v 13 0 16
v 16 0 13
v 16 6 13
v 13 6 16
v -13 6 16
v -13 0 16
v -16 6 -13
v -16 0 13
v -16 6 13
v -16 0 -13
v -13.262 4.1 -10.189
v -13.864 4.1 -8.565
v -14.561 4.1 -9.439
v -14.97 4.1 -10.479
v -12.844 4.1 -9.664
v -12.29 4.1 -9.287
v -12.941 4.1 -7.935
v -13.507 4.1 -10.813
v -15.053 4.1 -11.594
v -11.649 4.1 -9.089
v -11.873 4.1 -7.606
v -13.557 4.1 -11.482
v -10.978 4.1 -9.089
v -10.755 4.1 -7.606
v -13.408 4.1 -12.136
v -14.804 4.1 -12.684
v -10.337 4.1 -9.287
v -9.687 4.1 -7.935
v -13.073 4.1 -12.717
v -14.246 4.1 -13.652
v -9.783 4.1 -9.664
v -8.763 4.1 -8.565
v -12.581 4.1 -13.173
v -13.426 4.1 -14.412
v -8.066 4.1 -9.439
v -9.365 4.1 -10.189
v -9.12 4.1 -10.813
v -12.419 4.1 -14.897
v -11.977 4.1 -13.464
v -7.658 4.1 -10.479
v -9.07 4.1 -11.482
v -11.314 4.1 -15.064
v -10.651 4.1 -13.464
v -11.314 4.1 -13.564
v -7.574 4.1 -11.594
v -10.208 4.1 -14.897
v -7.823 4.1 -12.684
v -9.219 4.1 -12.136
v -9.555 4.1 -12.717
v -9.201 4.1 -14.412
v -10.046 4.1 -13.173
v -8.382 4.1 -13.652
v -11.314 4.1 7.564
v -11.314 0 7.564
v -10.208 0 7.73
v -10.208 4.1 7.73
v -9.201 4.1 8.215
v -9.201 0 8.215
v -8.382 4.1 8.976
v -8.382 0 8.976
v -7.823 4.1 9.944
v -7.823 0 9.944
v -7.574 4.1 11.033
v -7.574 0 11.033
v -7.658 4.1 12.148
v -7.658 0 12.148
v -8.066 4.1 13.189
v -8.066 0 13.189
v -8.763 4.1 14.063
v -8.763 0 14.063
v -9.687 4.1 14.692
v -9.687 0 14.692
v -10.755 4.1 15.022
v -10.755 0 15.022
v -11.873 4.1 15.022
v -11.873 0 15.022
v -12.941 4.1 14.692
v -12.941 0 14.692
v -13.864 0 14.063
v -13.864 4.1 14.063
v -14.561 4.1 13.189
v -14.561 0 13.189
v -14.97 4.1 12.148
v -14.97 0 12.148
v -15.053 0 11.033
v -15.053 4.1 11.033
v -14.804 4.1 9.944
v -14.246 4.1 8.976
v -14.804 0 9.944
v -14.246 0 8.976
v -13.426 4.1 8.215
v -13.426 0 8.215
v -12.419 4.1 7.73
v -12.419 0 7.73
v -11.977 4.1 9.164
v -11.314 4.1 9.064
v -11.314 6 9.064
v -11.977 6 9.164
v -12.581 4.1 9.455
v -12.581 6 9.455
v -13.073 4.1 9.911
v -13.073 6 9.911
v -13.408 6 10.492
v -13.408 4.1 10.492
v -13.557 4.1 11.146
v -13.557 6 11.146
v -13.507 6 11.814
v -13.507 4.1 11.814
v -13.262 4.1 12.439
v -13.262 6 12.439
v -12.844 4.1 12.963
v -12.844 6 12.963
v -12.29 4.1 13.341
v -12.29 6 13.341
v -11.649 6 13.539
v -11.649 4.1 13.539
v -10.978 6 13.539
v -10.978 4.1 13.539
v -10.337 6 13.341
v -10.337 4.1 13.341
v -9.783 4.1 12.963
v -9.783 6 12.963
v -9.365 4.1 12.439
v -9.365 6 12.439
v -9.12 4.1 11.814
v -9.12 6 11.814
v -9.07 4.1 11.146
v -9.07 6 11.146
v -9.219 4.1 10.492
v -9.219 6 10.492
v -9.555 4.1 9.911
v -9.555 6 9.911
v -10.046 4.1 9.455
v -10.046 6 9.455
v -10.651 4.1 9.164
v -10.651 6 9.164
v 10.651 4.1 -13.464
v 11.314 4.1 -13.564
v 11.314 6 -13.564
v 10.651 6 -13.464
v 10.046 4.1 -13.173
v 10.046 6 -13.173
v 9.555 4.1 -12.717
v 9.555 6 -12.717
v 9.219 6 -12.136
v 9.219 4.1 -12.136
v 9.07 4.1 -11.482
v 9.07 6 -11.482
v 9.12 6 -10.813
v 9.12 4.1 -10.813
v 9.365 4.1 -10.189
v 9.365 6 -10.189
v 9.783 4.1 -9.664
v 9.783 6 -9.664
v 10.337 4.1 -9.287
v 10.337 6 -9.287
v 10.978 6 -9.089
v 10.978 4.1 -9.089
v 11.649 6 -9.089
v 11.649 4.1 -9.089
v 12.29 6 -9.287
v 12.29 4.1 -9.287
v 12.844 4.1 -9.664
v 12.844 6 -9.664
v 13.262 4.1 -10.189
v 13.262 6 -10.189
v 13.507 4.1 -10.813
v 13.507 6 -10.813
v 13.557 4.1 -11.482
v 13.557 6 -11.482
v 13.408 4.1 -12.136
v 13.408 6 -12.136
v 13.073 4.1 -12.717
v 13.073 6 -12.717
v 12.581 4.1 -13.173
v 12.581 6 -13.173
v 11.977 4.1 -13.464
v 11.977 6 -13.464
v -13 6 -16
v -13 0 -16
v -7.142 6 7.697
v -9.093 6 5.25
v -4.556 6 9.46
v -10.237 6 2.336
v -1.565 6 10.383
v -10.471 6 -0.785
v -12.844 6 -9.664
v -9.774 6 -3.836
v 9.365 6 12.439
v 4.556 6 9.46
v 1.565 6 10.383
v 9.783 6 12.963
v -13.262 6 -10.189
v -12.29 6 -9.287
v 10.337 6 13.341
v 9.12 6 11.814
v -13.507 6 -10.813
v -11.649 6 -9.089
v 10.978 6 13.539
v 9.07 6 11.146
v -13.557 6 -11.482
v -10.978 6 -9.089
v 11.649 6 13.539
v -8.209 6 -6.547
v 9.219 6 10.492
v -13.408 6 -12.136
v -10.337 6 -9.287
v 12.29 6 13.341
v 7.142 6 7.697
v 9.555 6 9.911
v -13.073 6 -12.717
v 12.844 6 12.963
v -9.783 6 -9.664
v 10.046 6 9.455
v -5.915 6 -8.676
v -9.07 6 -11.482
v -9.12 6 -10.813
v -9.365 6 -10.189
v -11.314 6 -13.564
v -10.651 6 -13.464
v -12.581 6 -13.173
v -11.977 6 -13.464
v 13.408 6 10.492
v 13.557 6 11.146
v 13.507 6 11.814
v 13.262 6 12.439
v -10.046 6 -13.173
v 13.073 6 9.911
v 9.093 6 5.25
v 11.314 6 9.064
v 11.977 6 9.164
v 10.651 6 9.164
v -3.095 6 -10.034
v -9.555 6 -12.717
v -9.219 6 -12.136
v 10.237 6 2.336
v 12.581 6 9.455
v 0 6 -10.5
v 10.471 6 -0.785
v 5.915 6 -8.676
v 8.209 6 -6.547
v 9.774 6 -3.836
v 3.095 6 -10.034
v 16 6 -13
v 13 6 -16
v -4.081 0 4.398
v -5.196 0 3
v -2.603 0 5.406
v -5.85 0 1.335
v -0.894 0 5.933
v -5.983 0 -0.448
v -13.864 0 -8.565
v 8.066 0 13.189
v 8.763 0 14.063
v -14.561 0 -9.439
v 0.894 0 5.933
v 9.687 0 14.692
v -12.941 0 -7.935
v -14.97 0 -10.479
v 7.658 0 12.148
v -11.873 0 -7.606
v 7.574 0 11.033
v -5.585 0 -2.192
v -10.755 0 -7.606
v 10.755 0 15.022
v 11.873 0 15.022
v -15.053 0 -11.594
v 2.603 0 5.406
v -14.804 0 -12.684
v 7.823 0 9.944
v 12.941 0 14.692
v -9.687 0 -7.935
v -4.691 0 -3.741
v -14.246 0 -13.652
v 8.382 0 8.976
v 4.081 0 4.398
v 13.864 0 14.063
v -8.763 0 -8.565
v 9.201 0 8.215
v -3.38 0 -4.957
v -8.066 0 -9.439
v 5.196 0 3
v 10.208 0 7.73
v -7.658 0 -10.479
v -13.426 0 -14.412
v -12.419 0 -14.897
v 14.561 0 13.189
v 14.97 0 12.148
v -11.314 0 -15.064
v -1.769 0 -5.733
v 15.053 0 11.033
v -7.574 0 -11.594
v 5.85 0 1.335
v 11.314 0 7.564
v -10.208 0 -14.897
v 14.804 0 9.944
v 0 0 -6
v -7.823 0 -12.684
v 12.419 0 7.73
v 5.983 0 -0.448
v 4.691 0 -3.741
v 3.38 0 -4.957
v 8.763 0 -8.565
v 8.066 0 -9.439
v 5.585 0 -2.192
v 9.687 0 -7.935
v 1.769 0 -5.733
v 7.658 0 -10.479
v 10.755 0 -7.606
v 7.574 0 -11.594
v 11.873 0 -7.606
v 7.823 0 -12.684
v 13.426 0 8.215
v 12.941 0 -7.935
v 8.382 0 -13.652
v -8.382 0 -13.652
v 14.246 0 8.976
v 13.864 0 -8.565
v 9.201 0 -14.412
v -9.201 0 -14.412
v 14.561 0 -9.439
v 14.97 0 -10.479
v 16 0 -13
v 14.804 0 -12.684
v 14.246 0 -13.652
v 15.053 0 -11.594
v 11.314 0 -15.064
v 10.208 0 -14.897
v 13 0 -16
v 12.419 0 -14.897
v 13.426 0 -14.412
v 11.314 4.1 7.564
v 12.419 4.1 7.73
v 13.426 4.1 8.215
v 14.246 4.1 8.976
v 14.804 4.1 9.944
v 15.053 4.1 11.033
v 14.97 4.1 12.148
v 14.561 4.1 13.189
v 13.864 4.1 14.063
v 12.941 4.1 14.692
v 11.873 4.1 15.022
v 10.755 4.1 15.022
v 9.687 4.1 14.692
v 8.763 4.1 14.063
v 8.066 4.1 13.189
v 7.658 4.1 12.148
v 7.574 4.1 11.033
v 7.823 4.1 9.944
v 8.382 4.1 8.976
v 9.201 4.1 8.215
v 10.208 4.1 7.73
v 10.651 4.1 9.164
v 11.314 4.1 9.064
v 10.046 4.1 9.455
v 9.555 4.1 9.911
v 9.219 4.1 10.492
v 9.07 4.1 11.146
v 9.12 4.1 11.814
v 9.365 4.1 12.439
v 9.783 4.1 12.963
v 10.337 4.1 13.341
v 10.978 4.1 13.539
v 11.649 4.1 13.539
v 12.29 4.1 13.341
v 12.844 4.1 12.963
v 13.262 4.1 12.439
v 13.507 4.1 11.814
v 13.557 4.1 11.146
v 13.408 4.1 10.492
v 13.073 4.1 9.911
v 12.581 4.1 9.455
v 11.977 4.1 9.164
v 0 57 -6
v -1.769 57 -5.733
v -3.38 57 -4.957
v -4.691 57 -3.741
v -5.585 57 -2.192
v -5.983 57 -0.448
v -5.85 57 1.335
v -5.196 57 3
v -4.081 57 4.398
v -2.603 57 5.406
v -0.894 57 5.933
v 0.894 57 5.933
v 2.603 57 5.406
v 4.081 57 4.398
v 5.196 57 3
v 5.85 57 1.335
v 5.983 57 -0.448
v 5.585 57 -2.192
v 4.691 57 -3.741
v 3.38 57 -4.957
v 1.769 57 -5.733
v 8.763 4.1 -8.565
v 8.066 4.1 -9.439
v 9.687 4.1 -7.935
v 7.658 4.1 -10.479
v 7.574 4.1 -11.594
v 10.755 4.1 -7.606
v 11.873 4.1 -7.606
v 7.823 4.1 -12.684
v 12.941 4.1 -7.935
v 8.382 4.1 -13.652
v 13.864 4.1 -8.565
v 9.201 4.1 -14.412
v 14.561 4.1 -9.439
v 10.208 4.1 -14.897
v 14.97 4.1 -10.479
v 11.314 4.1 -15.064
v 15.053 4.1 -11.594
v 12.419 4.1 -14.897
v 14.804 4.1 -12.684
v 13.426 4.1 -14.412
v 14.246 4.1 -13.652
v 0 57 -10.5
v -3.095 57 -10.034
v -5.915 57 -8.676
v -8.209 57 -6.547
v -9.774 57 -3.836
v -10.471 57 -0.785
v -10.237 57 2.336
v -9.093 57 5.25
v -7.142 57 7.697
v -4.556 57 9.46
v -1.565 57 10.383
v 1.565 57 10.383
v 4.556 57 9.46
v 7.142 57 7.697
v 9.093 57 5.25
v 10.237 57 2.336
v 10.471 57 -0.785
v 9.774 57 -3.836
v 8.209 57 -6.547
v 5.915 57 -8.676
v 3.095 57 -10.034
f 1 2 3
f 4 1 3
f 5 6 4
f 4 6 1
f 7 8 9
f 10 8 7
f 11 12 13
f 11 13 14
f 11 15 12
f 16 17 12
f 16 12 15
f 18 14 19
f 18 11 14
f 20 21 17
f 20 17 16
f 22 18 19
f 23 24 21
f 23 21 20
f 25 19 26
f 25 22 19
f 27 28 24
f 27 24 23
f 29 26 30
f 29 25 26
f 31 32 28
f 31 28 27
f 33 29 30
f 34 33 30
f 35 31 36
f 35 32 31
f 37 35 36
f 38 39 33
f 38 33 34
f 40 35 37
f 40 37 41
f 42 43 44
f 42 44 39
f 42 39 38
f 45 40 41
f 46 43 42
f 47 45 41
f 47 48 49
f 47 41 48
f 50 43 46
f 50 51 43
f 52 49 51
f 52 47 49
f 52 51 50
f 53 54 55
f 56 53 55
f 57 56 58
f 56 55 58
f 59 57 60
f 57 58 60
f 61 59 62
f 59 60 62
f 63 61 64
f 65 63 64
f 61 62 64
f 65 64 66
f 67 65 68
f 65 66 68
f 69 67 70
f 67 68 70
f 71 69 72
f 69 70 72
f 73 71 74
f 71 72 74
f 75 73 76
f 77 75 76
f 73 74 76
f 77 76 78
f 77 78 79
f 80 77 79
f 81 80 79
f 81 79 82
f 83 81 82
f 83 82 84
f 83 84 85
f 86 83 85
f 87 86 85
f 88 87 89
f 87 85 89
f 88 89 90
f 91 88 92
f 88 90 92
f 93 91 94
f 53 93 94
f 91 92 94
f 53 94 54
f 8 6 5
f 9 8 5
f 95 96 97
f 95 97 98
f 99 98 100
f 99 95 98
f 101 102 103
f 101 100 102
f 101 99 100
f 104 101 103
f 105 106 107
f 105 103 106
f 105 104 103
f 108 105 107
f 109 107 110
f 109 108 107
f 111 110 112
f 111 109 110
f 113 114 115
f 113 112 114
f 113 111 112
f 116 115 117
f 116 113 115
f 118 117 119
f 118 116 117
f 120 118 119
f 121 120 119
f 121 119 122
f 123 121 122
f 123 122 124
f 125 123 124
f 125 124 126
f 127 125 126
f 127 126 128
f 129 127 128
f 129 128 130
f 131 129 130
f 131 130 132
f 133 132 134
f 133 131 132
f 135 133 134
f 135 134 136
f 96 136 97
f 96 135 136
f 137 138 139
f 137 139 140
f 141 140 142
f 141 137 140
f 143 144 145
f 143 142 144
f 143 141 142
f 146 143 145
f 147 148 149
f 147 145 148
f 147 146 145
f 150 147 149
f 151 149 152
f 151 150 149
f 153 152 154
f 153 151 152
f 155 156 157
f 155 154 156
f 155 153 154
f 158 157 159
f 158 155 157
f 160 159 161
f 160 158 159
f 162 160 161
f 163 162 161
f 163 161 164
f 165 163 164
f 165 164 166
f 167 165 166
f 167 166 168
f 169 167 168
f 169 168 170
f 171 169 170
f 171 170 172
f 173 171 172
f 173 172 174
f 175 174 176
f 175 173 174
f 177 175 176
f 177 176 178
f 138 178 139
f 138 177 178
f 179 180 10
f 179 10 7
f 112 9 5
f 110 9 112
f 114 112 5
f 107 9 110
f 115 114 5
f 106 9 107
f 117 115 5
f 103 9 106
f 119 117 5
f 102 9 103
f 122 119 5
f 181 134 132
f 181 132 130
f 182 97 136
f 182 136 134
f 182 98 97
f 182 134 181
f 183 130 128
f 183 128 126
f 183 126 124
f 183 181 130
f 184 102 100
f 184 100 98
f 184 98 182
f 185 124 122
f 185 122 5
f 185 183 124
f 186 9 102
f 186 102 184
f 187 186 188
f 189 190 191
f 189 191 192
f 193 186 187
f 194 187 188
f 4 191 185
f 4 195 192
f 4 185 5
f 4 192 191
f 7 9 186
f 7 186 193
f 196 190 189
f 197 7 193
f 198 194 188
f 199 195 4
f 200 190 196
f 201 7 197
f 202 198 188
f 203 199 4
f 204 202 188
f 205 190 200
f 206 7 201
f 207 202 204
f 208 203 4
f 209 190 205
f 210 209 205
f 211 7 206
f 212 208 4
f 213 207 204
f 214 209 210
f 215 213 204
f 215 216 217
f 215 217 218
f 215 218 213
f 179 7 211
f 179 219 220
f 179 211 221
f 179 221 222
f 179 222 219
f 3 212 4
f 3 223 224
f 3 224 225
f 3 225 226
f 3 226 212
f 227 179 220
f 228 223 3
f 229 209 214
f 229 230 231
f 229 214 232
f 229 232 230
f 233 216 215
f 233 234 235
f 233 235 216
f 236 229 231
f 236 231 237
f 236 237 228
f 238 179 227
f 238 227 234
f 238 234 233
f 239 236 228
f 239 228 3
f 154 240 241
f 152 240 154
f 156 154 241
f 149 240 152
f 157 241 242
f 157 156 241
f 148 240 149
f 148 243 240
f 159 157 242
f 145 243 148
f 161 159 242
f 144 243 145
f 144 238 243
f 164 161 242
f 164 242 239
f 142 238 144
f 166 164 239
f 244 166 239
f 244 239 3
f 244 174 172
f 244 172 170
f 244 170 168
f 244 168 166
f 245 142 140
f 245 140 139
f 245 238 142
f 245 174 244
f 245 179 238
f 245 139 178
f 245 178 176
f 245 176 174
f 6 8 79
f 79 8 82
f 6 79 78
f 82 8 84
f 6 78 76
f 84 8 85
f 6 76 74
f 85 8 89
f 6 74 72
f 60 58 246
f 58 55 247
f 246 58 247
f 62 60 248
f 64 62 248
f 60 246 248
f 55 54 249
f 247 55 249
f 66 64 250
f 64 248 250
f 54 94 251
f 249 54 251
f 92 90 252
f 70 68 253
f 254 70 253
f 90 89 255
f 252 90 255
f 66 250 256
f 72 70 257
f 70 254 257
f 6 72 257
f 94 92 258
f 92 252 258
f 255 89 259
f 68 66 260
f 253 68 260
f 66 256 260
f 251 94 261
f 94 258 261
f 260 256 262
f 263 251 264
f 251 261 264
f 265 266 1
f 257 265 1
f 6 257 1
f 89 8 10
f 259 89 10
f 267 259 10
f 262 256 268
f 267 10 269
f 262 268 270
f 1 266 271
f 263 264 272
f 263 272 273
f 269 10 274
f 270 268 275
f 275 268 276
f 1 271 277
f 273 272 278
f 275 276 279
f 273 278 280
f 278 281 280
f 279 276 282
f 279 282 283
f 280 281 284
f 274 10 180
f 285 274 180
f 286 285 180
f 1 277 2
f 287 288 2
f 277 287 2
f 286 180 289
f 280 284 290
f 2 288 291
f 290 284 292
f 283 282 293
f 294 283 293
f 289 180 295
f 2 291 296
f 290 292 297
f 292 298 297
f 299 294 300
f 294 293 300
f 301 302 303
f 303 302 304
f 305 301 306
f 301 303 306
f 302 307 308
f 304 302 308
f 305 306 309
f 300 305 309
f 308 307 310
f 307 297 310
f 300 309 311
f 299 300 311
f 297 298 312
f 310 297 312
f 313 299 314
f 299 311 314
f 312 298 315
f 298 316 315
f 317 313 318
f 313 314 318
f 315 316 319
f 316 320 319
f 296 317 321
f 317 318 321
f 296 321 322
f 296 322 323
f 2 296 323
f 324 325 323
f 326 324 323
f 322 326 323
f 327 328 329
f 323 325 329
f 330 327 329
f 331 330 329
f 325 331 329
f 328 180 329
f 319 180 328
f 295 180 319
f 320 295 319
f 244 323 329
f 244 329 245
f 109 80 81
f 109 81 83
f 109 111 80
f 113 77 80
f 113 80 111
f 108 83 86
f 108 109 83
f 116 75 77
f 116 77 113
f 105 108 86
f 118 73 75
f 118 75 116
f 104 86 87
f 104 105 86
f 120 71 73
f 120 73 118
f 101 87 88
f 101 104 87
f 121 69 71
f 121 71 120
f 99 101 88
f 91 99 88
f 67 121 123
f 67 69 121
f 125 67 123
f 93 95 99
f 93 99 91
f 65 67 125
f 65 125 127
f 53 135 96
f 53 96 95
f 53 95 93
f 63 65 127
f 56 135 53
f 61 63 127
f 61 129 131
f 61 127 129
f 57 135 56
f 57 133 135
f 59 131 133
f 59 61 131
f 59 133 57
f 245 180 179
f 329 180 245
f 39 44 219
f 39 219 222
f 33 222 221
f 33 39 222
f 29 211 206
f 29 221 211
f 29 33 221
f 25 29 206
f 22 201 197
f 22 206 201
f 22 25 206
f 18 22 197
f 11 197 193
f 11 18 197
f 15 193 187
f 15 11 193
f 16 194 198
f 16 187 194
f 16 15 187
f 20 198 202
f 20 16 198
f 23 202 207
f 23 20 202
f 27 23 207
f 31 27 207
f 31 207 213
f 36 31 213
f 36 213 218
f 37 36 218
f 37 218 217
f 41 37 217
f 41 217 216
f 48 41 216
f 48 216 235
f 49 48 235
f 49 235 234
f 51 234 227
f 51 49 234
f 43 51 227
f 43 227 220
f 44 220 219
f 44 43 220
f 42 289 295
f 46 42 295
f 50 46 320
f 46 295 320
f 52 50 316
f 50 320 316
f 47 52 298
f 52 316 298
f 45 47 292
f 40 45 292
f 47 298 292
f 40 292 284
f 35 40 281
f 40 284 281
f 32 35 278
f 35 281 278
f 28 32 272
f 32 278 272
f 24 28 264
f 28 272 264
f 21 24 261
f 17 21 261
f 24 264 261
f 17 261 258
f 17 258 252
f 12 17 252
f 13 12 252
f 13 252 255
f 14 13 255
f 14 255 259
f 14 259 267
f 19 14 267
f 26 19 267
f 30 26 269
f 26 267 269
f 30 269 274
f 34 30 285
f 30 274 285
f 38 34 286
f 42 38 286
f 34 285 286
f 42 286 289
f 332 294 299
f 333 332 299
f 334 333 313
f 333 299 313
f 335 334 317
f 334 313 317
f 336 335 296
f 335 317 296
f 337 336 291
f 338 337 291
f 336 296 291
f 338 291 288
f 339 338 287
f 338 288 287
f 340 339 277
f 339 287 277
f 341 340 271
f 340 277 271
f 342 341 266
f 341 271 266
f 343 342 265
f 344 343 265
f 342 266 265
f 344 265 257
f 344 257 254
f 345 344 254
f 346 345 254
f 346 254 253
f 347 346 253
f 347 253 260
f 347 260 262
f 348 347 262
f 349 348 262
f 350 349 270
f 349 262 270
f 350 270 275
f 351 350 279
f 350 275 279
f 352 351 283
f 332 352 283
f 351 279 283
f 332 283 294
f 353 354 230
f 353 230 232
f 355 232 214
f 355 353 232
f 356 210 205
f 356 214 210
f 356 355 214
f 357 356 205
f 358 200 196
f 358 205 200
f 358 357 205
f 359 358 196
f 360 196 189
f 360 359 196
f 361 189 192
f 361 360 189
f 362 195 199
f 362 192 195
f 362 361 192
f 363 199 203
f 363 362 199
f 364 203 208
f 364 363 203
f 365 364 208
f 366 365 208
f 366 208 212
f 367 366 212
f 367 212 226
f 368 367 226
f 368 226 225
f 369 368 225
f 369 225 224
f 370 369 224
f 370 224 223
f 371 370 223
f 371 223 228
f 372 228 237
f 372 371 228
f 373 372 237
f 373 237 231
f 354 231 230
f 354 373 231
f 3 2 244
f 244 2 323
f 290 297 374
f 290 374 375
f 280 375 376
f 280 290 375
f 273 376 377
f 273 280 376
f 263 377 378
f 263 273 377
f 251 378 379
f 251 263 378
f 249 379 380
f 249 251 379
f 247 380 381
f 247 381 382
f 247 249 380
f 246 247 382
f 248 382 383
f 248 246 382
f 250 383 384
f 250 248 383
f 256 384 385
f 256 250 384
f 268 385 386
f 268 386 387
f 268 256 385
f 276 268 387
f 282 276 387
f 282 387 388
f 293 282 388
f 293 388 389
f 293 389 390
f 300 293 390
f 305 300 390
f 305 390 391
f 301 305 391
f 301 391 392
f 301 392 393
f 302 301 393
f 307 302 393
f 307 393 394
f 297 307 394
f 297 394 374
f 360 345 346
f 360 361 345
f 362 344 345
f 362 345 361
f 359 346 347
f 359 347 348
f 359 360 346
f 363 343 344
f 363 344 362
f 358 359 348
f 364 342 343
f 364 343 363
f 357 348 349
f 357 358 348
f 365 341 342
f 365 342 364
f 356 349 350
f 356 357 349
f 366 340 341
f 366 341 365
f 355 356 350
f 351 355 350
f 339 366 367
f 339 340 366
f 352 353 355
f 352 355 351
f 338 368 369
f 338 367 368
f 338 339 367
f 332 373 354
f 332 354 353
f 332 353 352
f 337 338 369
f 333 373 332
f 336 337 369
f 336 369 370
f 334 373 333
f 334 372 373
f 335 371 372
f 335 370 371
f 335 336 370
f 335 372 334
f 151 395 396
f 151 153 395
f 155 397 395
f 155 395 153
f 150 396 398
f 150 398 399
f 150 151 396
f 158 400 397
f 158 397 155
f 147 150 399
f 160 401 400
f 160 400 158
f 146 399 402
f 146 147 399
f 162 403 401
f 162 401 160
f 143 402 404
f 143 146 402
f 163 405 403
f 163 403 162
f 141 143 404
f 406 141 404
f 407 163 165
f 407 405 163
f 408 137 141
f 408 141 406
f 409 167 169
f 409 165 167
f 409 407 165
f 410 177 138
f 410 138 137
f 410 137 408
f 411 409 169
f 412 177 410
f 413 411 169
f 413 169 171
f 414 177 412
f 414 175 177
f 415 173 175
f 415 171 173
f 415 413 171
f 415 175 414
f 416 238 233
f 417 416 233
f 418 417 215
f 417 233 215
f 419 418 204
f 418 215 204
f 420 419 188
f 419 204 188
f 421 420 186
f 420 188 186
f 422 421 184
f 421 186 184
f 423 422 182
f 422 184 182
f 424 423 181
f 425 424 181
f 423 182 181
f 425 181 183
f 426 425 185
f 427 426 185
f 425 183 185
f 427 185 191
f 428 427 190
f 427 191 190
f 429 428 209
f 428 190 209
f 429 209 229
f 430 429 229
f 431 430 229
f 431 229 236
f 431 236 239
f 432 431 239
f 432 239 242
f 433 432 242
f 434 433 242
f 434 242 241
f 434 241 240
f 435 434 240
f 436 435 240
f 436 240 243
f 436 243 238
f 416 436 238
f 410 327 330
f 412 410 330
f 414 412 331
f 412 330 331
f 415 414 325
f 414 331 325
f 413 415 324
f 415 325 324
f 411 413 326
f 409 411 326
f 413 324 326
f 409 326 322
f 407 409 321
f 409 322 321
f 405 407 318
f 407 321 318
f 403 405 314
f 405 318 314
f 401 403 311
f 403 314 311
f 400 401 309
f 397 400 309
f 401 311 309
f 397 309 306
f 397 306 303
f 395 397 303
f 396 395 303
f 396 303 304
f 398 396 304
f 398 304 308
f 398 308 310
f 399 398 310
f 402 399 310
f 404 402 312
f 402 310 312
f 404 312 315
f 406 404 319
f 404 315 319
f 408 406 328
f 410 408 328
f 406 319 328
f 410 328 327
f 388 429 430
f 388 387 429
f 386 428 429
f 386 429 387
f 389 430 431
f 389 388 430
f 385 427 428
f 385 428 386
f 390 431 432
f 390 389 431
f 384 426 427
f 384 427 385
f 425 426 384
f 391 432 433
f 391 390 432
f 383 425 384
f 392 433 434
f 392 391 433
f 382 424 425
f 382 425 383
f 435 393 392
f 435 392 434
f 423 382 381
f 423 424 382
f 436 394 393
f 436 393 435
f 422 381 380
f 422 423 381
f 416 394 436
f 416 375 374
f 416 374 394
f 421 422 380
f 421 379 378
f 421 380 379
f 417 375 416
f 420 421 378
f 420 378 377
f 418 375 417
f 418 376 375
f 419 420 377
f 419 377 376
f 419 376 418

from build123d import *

# Parameters (mm, degrees)
SKETCH1_R           = 10.5
SKETCH1_R_2         = 6
BOSS_EXTRUDE1_DEPTH = 57
SKETCH2_W           = 32
SKETCH2_H           = 32
SKETCH2_R           = 6
BOSS_EXTRUDE2_DEPTH = 6
SKETCH3_R           = 2.25
CUT_EXTRUDE1_DEPTH  = 62.326992426
CHAMFER1_SIZE       = 3
SKETCH5_R           = 3.75
CUT_EXTRUDE2_DEPTH  = 4.1


with BuildPart() as part:
    # Sketch1 → Boss-Extrude1 (new body)
    with BuildSketch(Plane(origin=(0, 0, 0), x_dir=(1, 0, 0), z_dir=(0, 1, 0))):
        with Locations(Location((0, 0, 0), (0, 0, 90))):
            Circle(SKETCH1_R)
        with Locations(Location((0, 0, 0), (0, 0, 90))):
            Circle(SKETCH1_R_2, mode=Mode.SUBTRACT)
    extrude(amount=BOSS_EXTRUDE1_DEPTH)

    # Sketch2 → Boss-Extrude2 (add)
    with BuildSketch(Plane(origin=(0, 0, 0), x_dir=(1, 0, 0), z_dir=(0, 1, 0))):
        Rectangle(SKETCH2_W, SKETCH2_H)
        with Locations(Location((0, 0, 0), (0, 0, 90))):
            Circle(SKETCH2_R, mode=Mode.SUBTRACT)
    extrude(amount=BOSS_EXTRUDE2_DEPTH)

    # Sketch3 → Cut-Extrude1 (cut, through all)
    with BuildSketch(Plane(origin=(0, 0, 0), x_dir=(1, 0, 0), z_dir=(0, 1, 0))):
        with Locations(Location((-11.313708499, 11.313708499, 0), (0, 0, 90))):
            Circle(SKETCH3_R)
        with Locations(Location((-11.313708499, -11.313708499, 0), (0, 0, 90))):
            Circle(SKETCH3_R)
        with Locations(Location((11.313708499, -11.313708499, 0), (0, 0, 90))):
            Circle(SKETCH3_R)
        with Locations(Location((11.313708499, 11.313708499, 0), (0, 0, 90))):
            Circle(SKETCH3_R)
    extrude(amount=CUT_EXTRUDE1_DEPTH, mode=Mode.SUBTRACT)

    # Chamfer1
    chamfer1_edges = [part.edges().sort_by_distance(p)[0] for p in [
        (16, 3, 16),
        (16, 3, -16),
        (-16, 3, -16),
        (-16, 3, 16),
    ]]
    chamfer(chamfer1_edges, length=CHAMFER1_SIZE)

    # Sketch5 → Cut-Extrude2 (cut)
    with BuildSketch(Plane.XZ):
        with Locations(Location((-11.313708499, 11.313708499, 0), (0, 0, 270))):
            Circle(SKETCH5_R)
        with Locations(Location((11.313708499, 11.313708499, 0), (0, 0, 270))):
            Circle(SKETCH5_R)
        with Locations(Location((11.313708499, -11.313708499, 0), (0, 0, 270))):
            Circle(SKETCH5_R)
        with Locations(Location((-11.313708499, -11.313708499, 0), (0, 0, 270))):
            Circle(SKETCH5_R)
    extrude(amount=-CUT_EXTRUDE2_DEPTH, mode=Mode.SUBTRACT)


solid = part.part
